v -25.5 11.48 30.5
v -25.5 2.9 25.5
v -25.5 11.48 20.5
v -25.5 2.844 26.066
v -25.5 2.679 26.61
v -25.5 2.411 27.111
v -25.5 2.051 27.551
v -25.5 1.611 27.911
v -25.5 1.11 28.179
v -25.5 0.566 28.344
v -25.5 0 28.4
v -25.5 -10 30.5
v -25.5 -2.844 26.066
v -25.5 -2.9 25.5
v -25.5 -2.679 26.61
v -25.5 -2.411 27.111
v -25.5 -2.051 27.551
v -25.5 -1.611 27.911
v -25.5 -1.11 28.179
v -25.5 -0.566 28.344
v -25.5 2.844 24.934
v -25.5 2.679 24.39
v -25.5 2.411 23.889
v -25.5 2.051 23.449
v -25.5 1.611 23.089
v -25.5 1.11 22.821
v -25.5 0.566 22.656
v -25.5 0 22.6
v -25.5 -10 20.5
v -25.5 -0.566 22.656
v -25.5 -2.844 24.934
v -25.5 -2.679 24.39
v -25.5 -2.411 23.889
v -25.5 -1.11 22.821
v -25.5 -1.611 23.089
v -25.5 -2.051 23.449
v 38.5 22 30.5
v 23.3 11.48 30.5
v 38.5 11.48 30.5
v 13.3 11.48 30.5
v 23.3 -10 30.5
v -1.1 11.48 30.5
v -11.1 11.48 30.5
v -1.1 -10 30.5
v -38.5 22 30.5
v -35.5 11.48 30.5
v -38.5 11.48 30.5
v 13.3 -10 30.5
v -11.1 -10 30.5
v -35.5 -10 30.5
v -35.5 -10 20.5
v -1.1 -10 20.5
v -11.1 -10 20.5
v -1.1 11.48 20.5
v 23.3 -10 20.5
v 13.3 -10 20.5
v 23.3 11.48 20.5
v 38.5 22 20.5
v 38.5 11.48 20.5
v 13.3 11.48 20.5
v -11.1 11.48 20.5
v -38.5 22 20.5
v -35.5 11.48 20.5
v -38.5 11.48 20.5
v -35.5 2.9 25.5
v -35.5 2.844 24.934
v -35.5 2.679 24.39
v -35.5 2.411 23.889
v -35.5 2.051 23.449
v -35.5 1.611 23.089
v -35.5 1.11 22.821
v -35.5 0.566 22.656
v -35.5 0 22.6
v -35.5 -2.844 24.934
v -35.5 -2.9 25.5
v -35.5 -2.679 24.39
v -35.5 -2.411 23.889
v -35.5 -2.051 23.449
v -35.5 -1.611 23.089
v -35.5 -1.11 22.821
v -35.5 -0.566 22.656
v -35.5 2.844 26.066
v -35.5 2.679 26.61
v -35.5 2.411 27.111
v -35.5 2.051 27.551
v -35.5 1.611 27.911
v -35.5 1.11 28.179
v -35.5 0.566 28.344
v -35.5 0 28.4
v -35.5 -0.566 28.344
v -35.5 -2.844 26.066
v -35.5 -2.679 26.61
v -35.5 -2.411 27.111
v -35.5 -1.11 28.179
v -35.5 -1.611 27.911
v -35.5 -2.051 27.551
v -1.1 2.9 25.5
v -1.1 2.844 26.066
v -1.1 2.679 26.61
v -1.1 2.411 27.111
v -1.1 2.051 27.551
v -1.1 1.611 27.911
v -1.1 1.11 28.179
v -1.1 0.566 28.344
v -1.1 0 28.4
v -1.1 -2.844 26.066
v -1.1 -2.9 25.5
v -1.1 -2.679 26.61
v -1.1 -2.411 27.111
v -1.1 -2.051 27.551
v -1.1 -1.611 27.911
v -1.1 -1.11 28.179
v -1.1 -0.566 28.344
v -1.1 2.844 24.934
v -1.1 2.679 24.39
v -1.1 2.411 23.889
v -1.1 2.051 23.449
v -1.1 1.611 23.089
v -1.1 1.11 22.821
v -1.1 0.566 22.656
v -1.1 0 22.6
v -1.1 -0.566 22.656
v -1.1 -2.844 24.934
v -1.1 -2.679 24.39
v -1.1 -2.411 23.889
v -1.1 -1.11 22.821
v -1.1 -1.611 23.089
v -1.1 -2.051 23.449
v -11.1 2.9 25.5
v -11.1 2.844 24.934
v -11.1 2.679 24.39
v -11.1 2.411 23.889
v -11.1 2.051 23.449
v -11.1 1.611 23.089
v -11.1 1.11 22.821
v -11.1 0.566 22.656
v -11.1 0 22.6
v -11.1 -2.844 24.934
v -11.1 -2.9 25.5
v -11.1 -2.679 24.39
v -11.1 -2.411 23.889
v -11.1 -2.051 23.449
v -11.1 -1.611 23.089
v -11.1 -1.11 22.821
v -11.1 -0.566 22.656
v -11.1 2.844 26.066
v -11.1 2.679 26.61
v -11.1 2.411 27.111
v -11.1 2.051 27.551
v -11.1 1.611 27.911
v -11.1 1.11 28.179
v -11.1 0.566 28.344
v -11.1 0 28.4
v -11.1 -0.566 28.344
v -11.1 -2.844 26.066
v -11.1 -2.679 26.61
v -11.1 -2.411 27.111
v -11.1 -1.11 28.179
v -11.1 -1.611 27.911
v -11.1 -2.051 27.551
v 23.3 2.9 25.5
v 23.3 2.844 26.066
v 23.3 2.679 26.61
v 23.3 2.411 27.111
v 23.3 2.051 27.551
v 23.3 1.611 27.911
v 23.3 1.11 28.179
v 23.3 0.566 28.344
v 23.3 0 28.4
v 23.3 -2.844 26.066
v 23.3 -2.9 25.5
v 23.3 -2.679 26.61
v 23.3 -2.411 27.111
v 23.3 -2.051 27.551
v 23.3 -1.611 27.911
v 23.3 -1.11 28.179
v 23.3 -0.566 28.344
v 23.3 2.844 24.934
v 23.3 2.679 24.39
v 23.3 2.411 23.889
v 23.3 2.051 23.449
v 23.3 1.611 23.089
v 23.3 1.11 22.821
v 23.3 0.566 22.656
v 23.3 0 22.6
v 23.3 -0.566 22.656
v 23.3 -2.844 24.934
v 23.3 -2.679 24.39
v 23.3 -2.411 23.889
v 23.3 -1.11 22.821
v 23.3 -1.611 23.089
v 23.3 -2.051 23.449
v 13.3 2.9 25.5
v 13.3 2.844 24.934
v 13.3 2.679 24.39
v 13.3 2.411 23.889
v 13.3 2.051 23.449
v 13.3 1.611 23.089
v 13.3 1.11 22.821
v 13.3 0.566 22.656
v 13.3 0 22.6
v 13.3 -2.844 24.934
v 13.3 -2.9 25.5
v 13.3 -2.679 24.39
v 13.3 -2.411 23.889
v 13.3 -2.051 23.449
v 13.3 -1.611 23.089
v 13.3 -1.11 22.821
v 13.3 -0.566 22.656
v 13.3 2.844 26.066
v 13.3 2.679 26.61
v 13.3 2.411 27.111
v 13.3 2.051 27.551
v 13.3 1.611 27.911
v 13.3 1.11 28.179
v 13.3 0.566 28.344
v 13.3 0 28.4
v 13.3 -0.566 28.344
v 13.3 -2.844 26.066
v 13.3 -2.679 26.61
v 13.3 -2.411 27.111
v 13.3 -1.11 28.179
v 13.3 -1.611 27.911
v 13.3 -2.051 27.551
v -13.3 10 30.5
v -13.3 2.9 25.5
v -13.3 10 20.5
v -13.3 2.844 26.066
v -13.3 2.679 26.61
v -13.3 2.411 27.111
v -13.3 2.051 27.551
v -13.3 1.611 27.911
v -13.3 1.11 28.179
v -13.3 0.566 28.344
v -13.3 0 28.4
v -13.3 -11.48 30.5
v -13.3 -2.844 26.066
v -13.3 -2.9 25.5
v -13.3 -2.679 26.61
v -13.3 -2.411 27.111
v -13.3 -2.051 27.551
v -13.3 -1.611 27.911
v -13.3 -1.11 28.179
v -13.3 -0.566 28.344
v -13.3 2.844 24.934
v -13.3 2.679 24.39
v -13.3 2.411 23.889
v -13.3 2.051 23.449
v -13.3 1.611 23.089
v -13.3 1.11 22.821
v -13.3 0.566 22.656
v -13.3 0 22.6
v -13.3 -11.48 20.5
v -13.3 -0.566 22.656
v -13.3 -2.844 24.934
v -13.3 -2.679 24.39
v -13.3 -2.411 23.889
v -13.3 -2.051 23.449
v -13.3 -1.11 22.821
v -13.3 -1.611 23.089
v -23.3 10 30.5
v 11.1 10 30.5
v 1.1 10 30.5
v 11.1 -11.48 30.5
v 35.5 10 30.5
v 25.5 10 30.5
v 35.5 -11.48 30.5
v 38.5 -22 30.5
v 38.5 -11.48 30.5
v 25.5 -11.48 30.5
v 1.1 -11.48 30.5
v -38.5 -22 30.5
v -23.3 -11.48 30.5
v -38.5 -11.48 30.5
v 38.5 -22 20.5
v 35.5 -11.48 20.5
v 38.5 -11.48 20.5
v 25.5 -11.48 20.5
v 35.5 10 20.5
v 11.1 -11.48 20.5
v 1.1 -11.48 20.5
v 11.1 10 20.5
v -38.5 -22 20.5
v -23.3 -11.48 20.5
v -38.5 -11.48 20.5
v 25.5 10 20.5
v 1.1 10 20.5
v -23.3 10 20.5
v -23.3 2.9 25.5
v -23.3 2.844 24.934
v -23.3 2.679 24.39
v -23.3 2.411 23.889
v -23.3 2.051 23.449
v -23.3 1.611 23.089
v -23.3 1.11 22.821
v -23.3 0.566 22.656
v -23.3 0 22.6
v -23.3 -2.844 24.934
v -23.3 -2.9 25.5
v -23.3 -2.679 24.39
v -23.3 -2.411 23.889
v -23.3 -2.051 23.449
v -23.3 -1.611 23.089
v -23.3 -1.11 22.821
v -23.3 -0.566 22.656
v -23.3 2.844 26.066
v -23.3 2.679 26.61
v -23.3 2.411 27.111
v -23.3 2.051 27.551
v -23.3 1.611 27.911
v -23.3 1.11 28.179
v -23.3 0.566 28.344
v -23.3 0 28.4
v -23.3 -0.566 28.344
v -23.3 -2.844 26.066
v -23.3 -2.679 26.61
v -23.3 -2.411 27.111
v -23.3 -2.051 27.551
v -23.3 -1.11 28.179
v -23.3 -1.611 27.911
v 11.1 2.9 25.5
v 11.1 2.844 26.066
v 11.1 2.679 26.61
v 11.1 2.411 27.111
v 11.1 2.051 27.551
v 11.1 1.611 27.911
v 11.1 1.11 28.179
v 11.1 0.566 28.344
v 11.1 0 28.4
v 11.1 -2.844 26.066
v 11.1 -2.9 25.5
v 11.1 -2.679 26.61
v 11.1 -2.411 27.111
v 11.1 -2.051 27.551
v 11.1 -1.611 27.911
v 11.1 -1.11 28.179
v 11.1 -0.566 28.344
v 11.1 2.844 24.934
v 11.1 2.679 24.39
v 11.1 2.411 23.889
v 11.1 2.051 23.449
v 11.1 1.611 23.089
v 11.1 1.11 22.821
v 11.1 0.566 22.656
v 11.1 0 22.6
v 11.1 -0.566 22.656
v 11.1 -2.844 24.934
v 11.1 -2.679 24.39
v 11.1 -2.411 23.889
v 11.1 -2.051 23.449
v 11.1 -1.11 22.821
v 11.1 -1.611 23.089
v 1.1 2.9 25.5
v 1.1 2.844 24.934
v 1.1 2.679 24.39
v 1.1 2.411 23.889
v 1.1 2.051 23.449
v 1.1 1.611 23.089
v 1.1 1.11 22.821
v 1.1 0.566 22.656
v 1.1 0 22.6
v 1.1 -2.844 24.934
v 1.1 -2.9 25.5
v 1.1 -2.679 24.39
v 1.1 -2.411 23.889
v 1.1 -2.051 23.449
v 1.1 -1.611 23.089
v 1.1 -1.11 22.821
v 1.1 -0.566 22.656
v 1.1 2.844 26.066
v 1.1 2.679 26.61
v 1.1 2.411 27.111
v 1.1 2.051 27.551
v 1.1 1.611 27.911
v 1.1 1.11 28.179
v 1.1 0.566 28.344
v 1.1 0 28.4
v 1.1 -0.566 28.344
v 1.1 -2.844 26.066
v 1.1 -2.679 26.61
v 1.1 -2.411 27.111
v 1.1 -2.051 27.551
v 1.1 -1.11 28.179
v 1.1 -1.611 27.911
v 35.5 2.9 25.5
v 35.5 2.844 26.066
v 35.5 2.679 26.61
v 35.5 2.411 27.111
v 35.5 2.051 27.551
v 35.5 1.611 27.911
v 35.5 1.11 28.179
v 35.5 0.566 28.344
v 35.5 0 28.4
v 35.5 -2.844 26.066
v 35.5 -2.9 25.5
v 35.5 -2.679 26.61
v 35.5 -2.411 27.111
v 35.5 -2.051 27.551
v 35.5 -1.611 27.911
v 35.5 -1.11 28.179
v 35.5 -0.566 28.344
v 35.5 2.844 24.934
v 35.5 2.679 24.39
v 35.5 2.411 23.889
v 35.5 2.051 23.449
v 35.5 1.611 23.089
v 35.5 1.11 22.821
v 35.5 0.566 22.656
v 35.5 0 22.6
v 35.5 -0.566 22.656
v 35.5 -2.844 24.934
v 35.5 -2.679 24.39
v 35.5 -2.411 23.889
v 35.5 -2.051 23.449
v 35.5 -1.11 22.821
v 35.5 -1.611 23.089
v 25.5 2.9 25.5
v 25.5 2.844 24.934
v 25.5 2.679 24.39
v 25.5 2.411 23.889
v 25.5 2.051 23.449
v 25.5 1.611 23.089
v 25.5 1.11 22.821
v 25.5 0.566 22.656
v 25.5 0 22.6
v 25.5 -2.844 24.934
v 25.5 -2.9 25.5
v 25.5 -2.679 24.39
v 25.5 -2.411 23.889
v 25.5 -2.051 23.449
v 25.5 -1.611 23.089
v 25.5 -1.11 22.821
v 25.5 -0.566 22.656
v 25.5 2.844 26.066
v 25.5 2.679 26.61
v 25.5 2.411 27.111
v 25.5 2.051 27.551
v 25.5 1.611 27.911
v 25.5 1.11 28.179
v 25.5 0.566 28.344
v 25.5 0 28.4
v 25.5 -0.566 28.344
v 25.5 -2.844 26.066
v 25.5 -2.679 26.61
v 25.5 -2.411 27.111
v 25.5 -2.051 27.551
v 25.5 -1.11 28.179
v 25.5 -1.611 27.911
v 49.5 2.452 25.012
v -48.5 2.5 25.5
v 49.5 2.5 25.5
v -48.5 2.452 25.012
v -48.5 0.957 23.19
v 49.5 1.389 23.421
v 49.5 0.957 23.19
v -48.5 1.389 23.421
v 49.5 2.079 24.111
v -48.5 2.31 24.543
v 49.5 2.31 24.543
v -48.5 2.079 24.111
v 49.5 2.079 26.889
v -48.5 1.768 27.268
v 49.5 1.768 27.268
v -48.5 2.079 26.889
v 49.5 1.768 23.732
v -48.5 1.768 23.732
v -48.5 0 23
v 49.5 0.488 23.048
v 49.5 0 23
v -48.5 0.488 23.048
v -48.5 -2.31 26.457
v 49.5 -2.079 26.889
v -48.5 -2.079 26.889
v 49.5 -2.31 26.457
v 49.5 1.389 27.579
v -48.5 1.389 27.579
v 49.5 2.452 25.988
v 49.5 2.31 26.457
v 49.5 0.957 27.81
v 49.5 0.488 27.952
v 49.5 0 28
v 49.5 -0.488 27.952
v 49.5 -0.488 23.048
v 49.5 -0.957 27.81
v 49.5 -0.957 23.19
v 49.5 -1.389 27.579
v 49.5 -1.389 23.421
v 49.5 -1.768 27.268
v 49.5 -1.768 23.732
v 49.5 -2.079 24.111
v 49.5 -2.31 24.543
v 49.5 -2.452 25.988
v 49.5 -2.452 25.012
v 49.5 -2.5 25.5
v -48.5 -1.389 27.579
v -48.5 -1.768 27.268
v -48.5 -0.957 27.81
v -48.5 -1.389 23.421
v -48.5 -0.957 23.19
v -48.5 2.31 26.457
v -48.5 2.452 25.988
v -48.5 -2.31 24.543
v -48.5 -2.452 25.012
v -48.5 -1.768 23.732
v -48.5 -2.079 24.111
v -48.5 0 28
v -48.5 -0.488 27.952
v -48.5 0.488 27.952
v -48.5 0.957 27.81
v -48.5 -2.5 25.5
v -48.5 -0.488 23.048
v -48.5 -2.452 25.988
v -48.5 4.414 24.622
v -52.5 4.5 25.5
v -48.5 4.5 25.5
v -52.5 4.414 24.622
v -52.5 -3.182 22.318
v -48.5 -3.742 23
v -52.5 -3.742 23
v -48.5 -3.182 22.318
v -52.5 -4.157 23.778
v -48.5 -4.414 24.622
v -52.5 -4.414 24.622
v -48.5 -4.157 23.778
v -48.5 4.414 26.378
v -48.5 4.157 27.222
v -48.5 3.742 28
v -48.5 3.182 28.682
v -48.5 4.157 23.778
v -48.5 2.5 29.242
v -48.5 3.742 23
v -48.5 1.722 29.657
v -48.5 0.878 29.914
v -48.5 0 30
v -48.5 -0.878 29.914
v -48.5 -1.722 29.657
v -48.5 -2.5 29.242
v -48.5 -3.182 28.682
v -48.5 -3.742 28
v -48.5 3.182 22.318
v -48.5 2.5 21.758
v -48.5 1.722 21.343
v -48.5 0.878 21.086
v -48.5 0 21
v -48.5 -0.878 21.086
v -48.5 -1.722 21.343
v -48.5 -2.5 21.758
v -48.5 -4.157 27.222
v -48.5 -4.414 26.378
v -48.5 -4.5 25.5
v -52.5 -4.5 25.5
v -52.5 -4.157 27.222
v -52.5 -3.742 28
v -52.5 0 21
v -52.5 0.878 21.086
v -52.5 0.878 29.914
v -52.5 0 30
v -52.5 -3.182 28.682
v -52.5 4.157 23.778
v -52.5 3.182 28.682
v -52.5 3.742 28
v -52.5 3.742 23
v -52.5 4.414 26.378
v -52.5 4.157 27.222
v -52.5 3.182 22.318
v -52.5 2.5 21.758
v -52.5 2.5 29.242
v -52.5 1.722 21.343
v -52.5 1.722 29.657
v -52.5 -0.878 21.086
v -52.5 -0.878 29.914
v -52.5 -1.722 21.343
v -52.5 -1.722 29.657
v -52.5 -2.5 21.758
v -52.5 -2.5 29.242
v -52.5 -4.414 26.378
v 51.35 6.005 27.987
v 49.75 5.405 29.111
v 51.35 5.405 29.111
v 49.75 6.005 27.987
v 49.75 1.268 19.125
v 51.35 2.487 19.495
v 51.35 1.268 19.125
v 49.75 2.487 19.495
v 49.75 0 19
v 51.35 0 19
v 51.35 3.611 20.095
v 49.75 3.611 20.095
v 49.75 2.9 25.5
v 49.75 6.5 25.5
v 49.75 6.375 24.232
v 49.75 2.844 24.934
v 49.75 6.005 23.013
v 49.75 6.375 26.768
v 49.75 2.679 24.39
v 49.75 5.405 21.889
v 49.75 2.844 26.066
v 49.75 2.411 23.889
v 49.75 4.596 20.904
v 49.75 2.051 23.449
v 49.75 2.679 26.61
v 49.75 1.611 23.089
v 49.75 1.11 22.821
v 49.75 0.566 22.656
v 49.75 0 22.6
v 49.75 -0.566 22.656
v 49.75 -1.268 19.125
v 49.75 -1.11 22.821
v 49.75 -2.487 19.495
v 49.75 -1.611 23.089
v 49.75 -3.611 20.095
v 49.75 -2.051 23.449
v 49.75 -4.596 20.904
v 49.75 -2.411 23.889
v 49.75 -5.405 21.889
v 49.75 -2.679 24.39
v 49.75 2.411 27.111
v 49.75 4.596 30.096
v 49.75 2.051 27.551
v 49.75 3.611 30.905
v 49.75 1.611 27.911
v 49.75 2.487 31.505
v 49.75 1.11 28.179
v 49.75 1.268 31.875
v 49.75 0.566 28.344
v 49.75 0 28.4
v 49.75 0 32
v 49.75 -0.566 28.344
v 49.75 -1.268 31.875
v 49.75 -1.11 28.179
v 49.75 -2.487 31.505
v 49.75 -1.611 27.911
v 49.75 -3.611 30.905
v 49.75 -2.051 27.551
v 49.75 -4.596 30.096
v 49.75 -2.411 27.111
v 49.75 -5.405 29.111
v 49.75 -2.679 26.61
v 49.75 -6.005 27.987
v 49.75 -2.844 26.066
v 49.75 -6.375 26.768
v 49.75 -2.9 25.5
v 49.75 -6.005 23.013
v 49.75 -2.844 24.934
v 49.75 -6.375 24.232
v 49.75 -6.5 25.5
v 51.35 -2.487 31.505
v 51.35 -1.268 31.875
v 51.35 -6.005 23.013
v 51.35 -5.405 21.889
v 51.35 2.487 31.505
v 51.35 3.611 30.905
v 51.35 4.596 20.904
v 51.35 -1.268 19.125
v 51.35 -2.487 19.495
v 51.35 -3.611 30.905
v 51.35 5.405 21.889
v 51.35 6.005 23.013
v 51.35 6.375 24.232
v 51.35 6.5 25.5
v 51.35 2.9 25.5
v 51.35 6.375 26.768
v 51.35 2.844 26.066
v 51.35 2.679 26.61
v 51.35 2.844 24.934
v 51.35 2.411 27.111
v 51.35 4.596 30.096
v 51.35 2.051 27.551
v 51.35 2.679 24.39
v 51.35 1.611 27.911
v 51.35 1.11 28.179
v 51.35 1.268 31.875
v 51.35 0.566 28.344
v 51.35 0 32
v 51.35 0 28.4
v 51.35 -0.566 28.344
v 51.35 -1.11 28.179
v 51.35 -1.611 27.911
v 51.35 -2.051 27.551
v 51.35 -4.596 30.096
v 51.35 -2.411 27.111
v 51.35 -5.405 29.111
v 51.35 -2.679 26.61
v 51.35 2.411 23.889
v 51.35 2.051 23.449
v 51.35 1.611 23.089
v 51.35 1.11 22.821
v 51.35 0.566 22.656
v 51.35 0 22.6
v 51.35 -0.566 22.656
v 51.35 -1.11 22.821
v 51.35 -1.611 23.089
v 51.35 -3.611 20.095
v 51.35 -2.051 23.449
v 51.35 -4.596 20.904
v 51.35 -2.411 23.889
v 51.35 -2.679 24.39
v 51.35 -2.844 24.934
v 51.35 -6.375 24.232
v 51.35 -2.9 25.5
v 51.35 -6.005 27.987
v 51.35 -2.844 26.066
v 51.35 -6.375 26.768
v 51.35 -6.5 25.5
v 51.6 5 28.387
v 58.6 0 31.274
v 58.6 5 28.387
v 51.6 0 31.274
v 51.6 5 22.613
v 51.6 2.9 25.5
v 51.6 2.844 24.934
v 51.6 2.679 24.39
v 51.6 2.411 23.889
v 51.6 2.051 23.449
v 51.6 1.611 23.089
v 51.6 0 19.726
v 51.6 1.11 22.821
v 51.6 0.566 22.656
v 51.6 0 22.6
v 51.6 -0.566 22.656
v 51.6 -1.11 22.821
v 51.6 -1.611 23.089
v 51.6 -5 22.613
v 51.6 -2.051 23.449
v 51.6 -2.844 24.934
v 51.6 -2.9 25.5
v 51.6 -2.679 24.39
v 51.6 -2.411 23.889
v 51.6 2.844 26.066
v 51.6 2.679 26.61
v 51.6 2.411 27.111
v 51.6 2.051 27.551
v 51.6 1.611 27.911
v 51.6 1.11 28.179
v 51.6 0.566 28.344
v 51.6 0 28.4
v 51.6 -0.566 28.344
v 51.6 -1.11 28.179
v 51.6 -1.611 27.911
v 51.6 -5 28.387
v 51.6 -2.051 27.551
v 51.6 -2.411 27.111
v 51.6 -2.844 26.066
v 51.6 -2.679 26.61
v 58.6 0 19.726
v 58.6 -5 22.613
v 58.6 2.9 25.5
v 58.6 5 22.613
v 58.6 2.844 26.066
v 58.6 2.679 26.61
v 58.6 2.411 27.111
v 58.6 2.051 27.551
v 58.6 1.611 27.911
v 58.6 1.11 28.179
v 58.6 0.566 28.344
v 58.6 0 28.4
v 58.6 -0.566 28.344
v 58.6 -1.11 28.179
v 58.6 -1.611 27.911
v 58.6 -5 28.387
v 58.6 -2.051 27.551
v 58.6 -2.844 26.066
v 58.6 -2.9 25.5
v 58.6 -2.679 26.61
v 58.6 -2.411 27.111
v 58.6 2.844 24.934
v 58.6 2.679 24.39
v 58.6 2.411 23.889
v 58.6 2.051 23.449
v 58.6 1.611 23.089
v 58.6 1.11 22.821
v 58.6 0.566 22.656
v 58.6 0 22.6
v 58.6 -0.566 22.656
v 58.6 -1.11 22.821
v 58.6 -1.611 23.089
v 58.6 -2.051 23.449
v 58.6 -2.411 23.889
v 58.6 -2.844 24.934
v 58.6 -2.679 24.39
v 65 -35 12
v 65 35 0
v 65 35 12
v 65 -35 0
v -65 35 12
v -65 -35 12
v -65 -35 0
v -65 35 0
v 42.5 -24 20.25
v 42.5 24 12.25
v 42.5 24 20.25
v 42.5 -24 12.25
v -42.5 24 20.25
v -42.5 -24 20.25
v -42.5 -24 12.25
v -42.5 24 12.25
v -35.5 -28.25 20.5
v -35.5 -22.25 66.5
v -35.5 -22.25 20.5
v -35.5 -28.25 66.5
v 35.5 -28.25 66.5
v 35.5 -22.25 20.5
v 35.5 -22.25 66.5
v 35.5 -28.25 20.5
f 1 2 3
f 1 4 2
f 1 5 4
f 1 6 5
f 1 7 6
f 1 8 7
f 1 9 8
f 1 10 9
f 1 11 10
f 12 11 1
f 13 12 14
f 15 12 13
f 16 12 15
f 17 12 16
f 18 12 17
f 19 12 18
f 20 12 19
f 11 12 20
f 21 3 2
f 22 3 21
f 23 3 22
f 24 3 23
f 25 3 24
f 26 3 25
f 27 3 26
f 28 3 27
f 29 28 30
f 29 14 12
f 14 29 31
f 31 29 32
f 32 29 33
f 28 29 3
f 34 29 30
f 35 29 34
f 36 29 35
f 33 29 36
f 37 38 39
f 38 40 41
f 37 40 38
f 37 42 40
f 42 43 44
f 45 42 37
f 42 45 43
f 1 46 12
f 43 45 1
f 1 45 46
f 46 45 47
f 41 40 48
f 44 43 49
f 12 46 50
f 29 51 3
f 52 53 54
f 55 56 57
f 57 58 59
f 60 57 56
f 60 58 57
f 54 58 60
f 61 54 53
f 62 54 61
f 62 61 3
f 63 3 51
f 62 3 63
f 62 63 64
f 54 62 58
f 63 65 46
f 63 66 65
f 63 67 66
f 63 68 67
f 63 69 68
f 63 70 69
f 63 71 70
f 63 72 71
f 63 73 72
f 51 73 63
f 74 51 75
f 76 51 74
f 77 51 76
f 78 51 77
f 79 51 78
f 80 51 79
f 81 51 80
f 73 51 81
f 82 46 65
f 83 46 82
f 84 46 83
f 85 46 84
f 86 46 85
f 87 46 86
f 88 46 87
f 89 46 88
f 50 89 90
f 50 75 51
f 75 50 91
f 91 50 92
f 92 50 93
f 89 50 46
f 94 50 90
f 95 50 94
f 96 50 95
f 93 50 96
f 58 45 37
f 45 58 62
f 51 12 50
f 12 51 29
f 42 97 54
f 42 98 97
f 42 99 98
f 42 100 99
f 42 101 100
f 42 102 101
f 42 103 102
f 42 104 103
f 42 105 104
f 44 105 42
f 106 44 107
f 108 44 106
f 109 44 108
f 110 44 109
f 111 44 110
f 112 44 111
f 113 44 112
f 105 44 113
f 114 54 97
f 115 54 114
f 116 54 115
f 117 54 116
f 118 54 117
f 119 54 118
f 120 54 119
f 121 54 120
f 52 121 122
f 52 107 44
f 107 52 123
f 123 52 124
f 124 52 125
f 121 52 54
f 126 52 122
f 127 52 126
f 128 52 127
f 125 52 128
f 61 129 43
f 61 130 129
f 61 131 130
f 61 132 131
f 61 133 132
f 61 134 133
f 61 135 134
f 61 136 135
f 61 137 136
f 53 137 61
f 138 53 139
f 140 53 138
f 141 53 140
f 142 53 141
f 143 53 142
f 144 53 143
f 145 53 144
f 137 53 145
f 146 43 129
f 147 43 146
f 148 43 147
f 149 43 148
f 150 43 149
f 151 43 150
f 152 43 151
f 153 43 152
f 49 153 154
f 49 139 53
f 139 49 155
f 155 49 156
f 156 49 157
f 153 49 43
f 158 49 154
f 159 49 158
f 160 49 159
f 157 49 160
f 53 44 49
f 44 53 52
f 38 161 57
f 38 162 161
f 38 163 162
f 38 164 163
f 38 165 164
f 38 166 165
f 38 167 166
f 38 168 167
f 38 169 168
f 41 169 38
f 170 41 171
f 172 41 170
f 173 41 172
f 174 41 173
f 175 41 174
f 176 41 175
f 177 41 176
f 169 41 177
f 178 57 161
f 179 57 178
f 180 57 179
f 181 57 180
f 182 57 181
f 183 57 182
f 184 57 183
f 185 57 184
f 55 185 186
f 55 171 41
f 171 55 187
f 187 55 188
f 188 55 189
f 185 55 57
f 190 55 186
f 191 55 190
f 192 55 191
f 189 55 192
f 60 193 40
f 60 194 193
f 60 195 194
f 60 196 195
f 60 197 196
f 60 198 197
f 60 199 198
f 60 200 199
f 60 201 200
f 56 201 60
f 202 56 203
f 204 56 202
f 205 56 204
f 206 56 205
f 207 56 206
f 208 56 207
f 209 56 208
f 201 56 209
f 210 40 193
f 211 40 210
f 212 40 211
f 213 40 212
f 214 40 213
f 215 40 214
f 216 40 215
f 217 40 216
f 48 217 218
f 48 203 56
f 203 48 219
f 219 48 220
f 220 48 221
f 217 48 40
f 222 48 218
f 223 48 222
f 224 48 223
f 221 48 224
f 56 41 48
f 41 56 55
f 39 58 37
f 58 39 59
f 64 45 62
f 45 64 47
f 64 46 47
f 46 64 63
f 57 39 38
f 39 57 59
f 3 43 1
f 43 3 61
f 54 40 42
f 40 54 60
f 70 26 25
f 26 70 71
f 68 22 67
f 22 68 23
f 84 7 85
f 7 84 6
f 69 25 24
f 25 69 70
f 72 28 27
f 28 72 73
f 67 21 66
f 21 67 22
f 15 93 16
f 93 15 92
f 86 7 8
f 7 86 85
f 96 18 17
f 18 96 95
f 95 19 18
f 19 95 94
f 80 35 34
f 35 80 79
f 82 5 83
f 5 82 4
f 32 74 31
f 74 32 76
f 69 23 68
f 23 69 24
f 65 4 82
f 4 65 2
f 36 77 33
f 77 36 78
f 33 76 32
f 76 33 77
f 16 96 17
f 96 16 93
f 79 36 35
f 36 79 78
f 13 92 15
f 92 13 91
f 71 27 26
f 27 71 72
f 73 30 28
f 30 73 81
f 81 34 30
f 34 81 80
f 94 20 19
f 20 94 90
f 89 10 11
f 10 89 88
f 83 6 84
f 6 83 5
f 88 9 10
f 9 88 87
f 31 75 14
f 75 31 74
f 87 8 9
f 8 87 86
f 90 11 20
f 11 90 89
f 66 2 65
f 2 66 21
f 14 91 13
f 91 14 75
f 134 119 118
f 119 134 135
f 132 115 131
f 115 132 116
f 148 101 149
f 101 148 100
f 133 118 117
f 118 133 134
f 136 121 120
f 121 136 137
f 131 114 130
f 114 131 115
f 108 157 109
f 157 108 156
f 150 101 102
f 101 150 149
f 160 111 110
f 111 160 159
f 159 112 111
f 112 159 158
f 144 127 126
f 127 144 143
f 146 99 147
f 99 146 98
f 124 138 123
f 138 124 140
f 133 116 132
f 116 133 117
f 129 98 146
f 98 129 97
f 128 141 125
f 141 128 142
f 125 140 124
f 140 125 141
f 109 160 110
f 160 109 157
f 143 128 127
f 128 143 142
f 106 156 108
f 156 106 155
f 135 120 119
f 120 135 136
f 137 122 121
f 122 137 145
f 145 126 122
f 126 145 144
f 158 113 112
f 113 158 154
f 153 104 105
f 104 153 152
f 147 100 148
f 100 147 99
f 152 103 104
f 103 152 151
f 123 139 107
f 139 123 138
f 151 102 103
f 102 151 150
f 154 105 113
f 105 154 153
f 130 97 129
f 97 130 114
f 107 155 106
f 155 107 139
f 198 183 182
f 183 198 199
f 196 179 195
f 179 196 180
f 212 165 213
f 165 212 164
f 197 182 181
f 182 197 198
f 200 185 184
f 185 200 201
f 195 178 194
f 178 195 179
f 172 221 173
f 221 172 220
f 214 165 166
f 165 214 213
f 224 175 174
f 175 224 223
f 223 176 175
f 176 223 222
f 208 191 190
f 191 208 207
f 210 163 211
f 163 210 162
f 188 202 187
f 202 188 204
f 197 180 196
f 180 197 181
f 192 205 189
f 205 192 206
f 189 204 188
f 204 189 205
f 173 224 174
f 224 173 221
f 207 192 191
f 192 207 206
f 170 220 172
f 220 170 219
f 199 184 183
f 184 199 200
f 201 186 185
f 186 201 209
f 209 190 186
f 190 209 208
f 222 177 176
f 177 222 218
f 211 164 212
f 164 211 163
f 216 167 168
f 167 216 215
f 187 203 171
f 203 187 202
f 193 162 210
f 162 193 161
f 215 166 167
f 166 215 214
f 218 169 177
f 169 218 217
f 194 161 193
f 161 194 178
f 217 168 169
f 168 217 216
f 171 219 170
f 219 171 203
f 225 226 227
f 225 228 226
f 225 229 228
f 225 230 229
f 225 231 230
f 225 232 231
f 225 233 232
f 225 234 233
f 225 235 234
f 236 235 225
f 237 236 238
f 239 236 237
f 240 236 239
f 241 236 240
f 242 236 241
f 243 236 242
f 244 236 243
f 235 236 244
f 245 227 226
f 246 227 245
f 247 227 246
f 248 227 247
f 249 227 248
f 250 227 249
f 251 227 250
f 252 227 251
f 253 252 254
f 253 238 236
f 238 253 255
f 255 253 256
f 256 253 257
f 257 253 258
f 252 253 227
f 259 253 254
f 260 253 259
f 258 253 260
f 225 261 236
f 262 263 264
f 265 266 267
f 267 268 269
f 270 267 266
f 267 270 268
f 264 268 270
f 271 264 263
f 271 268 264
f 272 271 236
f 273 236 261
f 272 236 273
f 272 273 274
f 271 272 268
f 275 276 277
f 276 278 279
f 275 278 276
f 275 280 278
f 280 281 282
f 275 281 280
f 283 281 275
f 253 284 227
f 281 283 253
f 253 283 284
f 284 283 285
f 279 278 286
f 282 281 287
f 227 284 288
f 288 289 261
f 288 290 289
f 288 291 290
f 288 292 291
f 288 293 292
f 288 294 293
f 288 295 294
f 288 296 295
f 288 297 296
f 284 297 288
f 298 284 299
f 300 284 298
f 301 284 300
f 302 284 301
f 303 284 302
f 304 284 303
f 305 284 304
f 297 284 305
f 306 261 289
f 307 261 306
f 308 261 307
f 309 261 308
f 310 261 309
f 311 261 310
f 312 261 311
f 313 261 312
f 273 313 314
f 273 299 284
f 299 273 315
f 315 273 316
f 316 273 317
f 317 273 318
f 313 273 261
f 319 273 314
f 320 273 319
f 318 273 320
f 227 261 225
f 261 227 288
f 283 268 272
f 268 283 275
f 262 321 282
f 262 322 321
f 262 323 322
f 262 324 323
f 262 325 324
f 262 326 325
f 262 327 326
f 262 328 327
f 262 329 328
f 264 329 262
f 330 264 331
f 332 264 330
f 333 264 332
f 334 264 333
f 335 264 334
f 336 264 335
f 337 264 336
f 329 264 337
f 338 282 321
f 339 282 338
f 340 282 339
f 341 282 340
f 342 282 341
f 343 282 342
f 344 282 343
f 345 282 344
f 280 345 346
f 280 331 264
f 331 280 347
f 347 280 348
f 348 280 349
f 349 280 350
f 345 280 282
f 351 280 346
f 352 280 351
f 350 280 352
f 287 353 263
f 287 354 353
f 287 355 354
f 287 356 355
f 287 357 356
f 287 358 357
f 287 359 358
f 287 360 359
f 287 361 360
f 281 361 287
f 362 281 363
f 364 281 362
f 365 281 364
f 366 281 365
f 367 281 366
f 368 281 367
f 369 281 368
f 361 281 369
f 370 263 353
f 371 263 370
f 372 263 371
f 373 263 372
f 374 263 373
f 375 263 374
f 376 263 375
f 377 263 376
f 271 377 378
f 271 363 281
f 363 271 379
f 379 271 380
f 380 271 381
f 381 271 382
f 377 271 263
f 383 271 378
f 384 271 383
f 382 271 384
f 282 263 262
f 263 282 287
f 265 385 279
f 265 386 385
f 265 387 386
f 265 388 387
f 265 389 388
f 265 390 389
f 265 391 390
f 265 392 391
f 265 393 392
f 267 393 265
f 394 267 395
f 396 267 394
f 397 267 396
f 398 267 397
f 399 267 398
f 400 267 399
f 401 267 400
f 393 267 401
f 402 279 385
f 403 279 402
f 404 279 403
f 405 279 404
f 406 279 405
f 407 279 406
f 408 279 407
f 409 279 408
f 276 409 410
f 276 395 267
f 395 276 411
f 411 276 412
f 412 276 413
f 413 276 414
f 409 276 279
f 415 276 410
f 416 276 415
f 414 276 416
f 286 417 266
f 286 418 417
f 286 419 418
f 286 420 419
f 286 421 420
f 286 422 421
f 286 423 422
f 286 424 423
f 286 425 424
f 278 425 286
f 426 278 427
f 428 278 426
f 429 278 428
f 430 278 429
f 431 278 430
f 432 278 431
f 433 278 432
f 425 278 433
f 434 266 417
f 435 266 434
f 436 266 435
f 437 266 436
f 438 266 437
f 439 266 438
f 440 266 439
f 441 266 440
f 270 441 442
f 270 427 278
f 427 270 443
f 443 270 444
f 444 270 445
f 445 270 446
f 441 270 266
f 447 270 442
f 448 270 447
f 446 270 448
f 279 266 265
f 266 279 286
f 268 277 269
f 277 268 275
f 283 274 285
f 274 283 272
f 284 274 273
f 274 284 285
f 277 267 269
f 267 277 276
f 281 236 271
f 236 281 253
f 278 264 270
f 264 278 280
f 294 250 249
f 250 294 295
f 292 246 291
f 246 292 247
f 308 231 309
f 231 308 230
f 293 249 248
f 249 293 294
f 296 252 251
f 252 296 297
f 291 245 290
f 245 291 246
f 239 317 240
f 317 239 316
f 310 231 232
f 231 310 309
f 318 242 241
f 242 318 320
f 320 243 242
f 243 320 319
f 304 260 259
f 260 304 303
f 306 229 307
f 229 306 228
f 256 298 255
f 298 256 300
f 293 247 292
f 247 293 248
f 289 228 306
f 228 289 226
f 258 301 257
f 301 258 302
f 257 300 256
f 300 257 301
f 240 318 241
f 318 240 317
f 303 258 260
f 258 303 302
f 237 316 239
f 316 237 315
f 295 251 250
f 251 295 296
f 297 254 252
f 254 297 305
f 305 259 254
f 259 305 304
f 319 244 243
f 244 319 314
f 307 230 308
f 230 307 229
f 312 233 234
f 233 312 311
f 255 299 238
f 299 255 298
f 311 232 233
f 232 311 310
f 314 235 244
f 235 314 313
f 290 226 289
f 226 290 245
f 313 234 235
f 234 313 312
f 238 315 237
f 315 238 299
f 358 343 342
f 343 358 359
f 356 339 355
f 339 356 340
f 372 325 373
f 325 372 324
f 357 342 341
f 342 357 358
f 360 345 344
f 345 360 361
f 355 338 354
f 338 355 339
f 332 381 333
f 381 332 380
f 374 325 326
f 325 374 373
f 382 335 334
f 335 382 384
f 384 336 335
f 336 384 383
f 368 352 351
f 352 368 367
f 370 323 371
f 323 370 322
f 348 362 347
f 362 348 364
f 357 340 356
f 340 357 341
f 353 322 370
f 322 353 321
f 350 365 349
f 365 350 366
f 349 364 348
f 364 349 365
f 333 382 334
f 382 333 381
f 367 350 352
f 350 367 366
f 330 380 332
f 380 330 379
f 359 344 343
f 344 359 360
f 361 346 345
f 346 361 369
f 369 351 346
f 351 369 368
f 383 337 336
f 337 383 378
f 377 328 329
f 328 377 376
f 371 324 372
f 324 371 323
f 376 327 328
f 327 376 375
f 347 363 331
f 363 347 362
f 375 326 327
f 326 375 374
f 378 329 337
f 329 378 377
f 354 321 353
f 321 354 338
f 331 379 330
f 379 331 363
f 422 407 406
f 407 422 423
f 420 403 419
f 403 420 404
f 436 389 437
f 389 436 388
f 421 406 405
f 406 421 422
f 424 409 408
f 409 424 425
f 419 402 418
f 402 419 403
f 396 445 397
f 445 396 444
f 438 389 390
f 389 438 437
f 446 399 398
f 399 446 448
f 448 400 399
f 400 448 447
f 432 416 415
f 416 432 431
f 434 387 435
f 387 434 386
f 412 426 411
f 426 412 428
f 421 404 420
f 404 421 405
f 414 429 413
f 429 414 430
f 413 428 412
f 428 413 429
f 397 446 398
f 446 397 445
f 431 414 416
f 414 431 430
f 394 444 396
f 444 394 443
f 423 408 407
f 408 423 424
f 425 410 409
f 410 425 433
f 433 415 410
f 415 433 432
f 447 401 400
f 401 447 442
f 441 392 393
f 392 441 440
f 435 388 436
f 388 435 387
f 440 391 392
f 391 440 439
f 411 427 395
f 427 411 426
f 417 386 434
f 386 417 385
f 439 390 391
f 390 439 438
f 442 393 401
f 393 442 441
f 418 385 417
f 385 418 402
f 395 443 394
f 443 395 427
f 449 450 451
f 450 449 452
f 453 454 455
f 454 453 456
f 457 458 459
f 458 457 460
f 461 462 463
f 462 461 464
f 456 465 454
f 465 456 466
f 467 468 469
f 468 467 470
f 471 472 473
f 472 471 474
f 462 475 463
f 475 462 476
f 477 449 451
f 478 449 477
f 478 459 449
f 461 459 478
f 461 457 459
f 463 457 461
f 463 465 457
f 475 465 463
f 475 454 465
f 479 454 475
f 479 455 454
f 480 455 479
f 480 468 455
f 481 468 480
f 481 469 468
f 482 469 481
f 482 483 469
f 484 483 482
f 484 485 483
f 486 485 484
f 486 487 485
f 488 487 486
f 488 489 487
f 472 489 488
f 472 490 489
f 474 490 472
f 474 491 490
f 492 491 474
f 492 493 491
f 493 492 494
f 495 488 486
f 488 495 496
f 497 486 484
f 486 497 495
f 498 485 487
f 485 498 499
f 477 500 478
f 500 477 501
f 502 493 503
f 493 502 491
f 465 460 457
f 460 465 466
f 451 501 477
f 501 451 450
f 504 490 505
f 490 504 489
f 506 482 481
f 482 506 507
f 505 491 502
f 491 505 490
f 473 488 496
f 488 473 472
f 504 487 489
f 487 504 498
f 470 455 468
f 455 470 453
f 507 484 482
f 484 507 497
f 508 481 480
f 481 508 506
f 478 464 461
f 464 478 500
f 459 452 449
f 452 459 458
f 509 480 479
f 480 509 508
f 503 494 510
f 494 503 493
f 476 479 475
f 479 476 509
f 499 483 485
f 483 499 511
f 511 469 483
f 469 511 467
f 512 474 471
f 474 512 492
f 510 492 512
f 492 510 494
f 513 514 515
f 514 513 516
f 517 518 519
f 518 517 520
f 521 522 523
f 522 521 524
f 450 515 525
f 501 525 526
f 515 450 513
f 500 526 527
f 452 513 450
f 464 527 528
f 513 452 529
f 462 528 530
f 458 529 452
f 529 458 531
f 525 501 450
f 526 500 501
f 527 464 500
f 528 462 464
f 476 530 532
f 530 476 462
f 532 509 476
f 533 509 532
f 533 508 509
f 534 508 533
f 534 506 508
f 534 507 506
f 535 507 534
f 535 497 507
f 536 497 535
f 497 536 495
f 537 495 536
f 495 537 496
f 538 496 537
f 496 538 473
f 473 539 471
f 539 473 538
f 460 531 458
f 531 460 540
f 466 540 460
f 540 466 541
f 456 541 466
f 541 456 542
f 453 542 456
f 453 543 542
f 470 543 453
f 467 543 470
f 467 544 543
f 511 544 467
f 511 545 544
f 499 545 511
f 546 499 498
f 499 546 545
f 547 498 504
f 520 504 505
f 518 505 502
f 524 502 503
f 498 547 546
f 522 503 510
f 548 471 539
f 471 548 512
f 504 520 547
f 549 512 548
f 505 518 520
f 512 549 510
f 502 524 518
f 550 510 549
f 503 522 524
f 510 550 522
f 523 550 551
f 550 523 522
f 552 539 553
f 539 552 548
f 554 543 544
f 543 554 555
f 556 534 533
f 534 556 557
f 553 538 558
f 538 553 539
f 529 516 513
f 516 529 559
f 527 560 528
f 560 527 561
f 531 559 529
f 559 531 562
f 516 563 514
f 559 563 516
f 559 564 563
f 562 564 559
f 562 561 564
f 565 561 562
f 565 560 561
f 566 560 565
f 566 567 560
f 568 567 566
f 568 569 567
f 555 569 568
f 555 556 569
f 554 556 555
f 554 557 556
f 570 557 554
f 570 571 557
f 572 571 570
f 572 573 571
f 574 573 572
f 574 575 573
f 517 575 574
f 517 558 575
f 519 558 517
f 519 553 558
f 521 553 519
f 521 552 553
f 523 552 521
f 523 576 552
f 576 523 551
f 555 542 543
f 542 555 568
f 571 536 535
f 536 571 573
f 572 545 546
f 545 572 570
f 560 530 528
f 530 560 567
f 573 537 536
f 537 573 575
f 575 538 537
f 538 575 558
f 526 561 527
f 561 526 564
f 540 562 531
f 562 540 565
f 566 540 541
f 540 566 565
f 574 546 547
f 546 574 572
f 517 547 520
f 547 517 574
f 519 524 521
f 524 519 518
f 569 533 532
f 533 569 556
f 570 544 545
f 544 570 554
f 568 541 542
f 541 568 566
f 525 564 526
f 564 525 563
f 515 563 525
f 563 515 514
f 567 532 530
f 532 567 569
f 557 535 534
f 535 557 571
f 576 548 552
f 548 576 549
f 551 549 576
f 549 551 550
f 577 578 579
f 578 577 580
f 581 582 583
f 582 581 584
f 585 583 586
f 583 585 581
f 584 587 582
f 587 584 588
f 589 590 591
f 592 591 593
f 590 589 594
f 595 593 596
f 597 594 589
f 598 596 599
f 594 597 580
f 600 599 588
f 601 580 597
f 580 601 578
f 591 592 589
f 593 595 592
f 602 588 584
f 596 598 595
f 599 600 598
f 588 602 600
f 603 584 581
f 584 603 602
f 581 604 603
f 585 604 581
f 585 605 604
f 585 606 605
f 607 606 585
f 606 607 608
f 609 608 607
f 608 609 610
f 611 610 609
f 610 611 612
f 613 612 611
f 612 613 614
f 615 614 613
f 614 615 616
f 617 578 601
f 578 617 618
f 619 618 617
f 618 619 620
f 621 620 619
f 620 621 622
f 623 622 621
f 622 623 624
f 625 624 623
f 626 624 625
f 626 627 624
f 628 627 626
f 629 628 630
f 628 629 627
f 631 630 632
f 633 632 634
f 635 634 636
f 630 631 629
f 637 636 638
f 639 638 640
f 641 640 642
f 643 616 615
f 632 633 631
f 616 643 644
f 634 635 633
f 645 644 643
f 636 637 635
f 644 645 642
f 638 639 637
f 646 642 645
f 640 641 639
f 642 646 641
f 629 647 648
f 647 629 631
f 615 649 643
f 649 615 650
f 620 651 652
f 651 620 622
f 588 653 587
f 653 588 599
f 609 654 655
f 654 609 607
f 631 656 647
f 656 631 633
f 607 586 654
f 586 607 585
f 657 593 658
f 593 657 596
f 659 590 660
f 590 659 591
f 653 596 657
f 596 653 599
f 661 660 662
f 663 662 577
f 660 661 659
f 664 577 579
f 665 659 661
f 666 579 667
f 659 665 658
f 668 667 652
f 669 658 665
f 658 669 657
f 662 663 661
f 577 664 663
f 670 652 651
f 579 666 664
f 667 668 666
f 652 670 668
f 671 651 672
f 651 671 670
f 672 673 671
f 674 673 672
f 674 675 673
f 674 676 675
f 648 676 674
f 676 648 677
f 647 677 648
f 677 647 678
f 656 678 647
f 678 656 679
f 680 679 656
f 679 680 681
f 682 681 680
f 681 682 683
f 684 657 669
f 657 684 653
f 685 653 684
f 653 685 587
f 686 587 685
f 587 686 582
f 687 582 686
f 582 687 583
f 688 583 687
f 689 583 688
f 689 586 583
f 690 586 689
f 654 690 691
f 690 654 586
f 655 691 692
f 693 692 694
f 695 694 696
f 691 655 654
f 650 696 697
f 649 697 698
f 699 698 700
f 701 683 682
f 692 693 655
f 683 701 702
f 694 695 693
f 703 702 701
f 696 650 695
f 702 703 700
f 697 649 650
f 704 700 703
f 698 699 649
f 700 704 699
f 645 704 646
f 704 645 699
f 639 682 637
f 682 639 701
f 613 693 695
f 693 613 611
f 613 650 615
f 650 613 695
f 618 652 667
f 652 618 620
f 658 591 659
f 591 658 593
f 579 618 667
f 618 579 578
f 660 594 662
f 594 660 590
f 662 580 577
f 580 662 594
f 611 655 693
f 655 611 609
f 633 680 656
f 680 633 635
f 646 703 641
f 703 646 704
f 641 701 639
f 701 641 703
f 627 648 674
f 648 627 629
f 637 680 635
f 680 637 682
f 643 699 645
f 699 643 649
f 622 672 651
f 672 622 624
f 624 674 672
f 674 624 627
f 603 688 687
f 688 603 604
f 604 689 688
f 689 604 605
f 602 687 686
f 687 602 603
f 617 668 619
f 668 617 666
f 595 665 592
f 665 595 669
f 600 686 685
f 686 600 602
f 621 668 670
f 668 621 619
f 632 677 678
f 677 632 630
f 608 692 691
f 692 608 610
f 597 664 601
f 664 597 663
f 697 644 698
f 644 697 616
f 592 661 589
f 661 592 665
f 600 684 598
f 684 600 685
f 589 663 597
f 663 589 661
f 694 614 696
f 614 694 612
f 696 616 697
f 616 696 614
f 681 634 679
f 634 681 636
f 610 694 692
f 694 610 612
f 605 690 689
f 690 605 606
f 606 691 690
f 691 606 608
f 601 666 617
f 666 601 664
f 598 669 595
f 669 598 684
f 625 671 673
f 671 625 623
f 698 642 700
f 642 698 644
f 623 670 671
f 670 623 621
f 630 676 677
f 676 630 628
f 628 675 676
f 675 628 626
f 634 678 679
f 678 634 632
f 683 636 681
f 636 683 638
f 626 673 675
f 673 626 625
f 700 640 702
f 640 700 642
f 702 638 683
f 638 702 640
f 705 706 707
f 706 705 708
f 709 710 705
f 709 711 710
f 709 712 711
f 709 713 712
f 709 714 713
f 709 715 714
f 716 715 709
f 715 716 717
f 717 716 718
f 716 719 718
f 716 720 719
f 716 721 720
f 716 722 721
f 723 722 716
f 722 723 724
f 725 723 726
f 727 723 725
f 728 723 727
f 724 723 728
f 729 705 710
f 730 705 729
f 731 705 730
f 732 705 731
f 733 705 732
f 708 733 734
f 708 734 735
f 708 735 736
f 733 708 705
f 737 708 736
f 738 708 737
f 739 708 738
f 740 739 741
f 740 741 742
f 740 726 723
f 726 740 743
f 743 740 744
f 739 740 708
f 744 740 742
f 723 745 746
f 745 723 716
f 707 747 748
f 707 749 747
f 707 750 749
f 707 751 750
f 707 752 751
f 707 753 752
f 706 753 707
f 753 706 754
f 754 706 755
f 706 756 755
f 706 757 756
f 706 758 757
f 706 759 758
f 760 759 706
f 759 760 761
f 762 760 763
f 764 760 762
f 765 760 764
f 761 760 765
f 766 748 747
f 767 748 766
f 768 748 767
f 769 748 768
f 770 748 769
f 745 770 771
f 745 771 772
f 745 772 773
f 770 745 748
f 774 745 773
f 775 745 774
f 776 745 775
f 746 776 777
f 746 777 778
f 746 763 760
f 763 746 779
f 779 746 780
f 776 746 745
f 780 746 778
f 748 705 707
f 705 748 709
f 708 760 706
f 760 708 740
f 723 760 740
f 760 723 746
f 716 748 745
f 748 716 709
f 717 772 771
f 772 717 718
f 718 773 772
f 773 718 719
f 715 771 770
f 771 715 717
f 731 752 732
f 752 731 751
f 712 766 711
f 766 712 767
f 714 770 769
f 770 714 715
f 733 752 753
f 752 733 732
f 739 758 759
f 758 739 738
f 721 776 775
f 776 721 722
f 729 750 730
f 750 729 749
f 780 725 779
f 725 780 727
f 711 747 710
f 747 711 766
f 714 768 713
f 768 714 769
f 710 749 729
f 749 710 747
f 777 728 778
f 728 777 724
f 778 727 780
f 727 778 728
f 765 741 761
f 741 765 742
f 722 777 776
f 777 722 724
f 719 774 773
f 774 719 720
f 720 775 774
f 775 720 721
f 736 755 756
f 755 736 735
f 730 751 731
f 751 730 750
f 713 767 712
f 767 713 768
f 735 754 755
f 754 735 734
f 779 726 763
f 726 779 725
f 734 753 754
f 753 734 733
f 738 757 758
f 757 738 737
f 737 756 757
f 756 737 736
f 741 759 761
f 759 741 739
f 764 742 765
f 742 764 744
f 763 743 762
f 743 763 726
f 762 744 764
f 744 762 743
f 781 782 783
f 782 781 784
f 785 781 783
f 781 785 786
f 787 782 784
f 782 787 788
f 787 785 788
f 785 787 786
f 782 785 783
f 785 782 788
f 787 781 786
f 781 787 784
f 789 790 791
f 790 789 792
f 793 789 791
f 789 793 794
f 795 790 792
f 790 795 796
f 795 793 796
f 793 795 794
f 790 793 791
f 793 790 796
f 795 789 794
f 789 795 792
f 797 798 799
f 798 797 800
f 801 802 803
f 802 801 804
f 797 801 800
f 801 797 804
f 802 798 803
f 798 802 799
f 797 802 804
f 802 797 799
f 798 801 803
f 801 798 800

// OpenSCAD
$fn = 32;

// ------------------------------------------------------------------------
// Comb hinge with flap: leaf 77 x 22 mm, pin d5, flap 46 mm
// Every part is its own module, assembly() places every instance.
// ------------------------------------------------------------------------

// --- part 1 ---
module hinge_bed() {
  difference() {
    translate([-65, -35, 0]) cube([130, 70, 12]);
  }
}

// --- part 2 ---
module hinge_riser() {
  difference() {
    translate([-42.5, -24, 0]) cube([85, 48, 8]);
  }
}

// --- part 3 ---
module hinge_leaf_a() {
  difference() {
    union() {
      translate([-35.5, -10, -5]) cube([10, 32, 10]);
      translate([-11.1, -10, -5]) cube([10, 32, 10]);
      translate([13.3, -10, -5]) cube([10, 32, 10]);
      translate([-38.5, 11.48, -5]) cube([77, 10.52, 10]);
    }
    translate([-30.5, 0, 0]) rotate([0, 90, 0]) cylinder(h = 12, d = 5.8, center = true);
    translate([-6.1, 0, 0]) rotate([0, 90, 0]) cylinder(h = 12, d = 5.8, center = true);
    translate([18.3, 0, 0]) rotate([0, 90, 0]) cylinder(h = 12, d = 5.8, center = true);
  }
}

// --- part 4 ---
module hinge_leaf_b() {
  difference() {
    union() {
      translate([-23.3, -22, -5]) cube([10, 32, 10]);
      translate([1.1, -22, -5]) cube([10, 32, 10]);
      translate([25.5, -22, -5]) cube([10, 32, 10]);
      translate([-38.5, -22, -5]) cube([77, 10.52, 10]);
    }
    translate([-18.3, 0, 0]) rotate([0, 90, 0]) cylinder(h = 12, d = 5.8, center = true);
    translate([6.1, 0, 0]) rotate([0, 90, 0]) cylinder(h = 12, d = 5.8, center = true);
    translate([30.5, 0, 0]) rotate([0, 90, 0]) cylinder(h = 12, d = 5.8, center = true);
  }
}

// --- part 5 ---
module hinge_flap() {
  difference() {
    translate([-35.5, -23, 0]) cube([71, 46, 6]);
  }
}

// --- part 6 ---
module hinge_pin() {
  rotate([0, 90, 0]) cylinder(h = 99, d = 5, center = true);
  translate([-52.5, 0, 0]) rotate([0, 90, 0]) cylinder(h = 4, d = 9);
}

// --- part 7 ---
module pin_washer() {
  difference() {
      translate([0, 0, 0]) cylinder(h = 1.6, d = 13);
      translate([0, 0, -1]) cylinder(h = 3.6, d = 5.8);
    }
}

// --- part 8 ---
module pin_nut() {
  difference() {
    linear_extrude(height = 7) polygon(points = [[5.774, 0], [2.887, 5], [-2.887, 5], [-5.774, 0], [-2.887, -5], [2.887, -5]]);
    translate([0, 0, -1]) cylinder(h = 9, d = 5.8);
  }
}

// --- assembly ---
module assembly() {
  color([0.80, 0.24, 0.20]) translate([0, 0, 0]) rotate([0, 0, 0]) hinge_bed();
  color([0.20, 0.45, 0.75]) translate([0, 0, 12.25]) rotate([0, 0, 0]) hinge_riser();
  color([0.25, 0.62, 0.32]) translate([0, 0, 25.5]) rotate([0, 0, 0]) hinge_leaf_a();
  color([0.92, 0.70, 0.18]) translate([0, 0, 25.5]) rotate([0, 0, 0]) hinge_leaf_b();
  color([0.58, 0.35, 0.70]) translate([0, -22.25, 43.5]) rotate([90, 0, 0]) hinge_flap();
  color([0.16, 0.66, 0.66]) translate([0, 0, 25.5]) rotate([0, 0, 0]) hinge_pin();
  color([0.85, 0.48, 0.18]) translate([49.75, 0, 25.5]) rotate([0, 90, 0]) pin_washer();
  color([0.55, 0.60, 0.65]) translate([51.6, 0, 25.5]) rotate([0, 90, 0]) pin_nut();
}

assembly();
